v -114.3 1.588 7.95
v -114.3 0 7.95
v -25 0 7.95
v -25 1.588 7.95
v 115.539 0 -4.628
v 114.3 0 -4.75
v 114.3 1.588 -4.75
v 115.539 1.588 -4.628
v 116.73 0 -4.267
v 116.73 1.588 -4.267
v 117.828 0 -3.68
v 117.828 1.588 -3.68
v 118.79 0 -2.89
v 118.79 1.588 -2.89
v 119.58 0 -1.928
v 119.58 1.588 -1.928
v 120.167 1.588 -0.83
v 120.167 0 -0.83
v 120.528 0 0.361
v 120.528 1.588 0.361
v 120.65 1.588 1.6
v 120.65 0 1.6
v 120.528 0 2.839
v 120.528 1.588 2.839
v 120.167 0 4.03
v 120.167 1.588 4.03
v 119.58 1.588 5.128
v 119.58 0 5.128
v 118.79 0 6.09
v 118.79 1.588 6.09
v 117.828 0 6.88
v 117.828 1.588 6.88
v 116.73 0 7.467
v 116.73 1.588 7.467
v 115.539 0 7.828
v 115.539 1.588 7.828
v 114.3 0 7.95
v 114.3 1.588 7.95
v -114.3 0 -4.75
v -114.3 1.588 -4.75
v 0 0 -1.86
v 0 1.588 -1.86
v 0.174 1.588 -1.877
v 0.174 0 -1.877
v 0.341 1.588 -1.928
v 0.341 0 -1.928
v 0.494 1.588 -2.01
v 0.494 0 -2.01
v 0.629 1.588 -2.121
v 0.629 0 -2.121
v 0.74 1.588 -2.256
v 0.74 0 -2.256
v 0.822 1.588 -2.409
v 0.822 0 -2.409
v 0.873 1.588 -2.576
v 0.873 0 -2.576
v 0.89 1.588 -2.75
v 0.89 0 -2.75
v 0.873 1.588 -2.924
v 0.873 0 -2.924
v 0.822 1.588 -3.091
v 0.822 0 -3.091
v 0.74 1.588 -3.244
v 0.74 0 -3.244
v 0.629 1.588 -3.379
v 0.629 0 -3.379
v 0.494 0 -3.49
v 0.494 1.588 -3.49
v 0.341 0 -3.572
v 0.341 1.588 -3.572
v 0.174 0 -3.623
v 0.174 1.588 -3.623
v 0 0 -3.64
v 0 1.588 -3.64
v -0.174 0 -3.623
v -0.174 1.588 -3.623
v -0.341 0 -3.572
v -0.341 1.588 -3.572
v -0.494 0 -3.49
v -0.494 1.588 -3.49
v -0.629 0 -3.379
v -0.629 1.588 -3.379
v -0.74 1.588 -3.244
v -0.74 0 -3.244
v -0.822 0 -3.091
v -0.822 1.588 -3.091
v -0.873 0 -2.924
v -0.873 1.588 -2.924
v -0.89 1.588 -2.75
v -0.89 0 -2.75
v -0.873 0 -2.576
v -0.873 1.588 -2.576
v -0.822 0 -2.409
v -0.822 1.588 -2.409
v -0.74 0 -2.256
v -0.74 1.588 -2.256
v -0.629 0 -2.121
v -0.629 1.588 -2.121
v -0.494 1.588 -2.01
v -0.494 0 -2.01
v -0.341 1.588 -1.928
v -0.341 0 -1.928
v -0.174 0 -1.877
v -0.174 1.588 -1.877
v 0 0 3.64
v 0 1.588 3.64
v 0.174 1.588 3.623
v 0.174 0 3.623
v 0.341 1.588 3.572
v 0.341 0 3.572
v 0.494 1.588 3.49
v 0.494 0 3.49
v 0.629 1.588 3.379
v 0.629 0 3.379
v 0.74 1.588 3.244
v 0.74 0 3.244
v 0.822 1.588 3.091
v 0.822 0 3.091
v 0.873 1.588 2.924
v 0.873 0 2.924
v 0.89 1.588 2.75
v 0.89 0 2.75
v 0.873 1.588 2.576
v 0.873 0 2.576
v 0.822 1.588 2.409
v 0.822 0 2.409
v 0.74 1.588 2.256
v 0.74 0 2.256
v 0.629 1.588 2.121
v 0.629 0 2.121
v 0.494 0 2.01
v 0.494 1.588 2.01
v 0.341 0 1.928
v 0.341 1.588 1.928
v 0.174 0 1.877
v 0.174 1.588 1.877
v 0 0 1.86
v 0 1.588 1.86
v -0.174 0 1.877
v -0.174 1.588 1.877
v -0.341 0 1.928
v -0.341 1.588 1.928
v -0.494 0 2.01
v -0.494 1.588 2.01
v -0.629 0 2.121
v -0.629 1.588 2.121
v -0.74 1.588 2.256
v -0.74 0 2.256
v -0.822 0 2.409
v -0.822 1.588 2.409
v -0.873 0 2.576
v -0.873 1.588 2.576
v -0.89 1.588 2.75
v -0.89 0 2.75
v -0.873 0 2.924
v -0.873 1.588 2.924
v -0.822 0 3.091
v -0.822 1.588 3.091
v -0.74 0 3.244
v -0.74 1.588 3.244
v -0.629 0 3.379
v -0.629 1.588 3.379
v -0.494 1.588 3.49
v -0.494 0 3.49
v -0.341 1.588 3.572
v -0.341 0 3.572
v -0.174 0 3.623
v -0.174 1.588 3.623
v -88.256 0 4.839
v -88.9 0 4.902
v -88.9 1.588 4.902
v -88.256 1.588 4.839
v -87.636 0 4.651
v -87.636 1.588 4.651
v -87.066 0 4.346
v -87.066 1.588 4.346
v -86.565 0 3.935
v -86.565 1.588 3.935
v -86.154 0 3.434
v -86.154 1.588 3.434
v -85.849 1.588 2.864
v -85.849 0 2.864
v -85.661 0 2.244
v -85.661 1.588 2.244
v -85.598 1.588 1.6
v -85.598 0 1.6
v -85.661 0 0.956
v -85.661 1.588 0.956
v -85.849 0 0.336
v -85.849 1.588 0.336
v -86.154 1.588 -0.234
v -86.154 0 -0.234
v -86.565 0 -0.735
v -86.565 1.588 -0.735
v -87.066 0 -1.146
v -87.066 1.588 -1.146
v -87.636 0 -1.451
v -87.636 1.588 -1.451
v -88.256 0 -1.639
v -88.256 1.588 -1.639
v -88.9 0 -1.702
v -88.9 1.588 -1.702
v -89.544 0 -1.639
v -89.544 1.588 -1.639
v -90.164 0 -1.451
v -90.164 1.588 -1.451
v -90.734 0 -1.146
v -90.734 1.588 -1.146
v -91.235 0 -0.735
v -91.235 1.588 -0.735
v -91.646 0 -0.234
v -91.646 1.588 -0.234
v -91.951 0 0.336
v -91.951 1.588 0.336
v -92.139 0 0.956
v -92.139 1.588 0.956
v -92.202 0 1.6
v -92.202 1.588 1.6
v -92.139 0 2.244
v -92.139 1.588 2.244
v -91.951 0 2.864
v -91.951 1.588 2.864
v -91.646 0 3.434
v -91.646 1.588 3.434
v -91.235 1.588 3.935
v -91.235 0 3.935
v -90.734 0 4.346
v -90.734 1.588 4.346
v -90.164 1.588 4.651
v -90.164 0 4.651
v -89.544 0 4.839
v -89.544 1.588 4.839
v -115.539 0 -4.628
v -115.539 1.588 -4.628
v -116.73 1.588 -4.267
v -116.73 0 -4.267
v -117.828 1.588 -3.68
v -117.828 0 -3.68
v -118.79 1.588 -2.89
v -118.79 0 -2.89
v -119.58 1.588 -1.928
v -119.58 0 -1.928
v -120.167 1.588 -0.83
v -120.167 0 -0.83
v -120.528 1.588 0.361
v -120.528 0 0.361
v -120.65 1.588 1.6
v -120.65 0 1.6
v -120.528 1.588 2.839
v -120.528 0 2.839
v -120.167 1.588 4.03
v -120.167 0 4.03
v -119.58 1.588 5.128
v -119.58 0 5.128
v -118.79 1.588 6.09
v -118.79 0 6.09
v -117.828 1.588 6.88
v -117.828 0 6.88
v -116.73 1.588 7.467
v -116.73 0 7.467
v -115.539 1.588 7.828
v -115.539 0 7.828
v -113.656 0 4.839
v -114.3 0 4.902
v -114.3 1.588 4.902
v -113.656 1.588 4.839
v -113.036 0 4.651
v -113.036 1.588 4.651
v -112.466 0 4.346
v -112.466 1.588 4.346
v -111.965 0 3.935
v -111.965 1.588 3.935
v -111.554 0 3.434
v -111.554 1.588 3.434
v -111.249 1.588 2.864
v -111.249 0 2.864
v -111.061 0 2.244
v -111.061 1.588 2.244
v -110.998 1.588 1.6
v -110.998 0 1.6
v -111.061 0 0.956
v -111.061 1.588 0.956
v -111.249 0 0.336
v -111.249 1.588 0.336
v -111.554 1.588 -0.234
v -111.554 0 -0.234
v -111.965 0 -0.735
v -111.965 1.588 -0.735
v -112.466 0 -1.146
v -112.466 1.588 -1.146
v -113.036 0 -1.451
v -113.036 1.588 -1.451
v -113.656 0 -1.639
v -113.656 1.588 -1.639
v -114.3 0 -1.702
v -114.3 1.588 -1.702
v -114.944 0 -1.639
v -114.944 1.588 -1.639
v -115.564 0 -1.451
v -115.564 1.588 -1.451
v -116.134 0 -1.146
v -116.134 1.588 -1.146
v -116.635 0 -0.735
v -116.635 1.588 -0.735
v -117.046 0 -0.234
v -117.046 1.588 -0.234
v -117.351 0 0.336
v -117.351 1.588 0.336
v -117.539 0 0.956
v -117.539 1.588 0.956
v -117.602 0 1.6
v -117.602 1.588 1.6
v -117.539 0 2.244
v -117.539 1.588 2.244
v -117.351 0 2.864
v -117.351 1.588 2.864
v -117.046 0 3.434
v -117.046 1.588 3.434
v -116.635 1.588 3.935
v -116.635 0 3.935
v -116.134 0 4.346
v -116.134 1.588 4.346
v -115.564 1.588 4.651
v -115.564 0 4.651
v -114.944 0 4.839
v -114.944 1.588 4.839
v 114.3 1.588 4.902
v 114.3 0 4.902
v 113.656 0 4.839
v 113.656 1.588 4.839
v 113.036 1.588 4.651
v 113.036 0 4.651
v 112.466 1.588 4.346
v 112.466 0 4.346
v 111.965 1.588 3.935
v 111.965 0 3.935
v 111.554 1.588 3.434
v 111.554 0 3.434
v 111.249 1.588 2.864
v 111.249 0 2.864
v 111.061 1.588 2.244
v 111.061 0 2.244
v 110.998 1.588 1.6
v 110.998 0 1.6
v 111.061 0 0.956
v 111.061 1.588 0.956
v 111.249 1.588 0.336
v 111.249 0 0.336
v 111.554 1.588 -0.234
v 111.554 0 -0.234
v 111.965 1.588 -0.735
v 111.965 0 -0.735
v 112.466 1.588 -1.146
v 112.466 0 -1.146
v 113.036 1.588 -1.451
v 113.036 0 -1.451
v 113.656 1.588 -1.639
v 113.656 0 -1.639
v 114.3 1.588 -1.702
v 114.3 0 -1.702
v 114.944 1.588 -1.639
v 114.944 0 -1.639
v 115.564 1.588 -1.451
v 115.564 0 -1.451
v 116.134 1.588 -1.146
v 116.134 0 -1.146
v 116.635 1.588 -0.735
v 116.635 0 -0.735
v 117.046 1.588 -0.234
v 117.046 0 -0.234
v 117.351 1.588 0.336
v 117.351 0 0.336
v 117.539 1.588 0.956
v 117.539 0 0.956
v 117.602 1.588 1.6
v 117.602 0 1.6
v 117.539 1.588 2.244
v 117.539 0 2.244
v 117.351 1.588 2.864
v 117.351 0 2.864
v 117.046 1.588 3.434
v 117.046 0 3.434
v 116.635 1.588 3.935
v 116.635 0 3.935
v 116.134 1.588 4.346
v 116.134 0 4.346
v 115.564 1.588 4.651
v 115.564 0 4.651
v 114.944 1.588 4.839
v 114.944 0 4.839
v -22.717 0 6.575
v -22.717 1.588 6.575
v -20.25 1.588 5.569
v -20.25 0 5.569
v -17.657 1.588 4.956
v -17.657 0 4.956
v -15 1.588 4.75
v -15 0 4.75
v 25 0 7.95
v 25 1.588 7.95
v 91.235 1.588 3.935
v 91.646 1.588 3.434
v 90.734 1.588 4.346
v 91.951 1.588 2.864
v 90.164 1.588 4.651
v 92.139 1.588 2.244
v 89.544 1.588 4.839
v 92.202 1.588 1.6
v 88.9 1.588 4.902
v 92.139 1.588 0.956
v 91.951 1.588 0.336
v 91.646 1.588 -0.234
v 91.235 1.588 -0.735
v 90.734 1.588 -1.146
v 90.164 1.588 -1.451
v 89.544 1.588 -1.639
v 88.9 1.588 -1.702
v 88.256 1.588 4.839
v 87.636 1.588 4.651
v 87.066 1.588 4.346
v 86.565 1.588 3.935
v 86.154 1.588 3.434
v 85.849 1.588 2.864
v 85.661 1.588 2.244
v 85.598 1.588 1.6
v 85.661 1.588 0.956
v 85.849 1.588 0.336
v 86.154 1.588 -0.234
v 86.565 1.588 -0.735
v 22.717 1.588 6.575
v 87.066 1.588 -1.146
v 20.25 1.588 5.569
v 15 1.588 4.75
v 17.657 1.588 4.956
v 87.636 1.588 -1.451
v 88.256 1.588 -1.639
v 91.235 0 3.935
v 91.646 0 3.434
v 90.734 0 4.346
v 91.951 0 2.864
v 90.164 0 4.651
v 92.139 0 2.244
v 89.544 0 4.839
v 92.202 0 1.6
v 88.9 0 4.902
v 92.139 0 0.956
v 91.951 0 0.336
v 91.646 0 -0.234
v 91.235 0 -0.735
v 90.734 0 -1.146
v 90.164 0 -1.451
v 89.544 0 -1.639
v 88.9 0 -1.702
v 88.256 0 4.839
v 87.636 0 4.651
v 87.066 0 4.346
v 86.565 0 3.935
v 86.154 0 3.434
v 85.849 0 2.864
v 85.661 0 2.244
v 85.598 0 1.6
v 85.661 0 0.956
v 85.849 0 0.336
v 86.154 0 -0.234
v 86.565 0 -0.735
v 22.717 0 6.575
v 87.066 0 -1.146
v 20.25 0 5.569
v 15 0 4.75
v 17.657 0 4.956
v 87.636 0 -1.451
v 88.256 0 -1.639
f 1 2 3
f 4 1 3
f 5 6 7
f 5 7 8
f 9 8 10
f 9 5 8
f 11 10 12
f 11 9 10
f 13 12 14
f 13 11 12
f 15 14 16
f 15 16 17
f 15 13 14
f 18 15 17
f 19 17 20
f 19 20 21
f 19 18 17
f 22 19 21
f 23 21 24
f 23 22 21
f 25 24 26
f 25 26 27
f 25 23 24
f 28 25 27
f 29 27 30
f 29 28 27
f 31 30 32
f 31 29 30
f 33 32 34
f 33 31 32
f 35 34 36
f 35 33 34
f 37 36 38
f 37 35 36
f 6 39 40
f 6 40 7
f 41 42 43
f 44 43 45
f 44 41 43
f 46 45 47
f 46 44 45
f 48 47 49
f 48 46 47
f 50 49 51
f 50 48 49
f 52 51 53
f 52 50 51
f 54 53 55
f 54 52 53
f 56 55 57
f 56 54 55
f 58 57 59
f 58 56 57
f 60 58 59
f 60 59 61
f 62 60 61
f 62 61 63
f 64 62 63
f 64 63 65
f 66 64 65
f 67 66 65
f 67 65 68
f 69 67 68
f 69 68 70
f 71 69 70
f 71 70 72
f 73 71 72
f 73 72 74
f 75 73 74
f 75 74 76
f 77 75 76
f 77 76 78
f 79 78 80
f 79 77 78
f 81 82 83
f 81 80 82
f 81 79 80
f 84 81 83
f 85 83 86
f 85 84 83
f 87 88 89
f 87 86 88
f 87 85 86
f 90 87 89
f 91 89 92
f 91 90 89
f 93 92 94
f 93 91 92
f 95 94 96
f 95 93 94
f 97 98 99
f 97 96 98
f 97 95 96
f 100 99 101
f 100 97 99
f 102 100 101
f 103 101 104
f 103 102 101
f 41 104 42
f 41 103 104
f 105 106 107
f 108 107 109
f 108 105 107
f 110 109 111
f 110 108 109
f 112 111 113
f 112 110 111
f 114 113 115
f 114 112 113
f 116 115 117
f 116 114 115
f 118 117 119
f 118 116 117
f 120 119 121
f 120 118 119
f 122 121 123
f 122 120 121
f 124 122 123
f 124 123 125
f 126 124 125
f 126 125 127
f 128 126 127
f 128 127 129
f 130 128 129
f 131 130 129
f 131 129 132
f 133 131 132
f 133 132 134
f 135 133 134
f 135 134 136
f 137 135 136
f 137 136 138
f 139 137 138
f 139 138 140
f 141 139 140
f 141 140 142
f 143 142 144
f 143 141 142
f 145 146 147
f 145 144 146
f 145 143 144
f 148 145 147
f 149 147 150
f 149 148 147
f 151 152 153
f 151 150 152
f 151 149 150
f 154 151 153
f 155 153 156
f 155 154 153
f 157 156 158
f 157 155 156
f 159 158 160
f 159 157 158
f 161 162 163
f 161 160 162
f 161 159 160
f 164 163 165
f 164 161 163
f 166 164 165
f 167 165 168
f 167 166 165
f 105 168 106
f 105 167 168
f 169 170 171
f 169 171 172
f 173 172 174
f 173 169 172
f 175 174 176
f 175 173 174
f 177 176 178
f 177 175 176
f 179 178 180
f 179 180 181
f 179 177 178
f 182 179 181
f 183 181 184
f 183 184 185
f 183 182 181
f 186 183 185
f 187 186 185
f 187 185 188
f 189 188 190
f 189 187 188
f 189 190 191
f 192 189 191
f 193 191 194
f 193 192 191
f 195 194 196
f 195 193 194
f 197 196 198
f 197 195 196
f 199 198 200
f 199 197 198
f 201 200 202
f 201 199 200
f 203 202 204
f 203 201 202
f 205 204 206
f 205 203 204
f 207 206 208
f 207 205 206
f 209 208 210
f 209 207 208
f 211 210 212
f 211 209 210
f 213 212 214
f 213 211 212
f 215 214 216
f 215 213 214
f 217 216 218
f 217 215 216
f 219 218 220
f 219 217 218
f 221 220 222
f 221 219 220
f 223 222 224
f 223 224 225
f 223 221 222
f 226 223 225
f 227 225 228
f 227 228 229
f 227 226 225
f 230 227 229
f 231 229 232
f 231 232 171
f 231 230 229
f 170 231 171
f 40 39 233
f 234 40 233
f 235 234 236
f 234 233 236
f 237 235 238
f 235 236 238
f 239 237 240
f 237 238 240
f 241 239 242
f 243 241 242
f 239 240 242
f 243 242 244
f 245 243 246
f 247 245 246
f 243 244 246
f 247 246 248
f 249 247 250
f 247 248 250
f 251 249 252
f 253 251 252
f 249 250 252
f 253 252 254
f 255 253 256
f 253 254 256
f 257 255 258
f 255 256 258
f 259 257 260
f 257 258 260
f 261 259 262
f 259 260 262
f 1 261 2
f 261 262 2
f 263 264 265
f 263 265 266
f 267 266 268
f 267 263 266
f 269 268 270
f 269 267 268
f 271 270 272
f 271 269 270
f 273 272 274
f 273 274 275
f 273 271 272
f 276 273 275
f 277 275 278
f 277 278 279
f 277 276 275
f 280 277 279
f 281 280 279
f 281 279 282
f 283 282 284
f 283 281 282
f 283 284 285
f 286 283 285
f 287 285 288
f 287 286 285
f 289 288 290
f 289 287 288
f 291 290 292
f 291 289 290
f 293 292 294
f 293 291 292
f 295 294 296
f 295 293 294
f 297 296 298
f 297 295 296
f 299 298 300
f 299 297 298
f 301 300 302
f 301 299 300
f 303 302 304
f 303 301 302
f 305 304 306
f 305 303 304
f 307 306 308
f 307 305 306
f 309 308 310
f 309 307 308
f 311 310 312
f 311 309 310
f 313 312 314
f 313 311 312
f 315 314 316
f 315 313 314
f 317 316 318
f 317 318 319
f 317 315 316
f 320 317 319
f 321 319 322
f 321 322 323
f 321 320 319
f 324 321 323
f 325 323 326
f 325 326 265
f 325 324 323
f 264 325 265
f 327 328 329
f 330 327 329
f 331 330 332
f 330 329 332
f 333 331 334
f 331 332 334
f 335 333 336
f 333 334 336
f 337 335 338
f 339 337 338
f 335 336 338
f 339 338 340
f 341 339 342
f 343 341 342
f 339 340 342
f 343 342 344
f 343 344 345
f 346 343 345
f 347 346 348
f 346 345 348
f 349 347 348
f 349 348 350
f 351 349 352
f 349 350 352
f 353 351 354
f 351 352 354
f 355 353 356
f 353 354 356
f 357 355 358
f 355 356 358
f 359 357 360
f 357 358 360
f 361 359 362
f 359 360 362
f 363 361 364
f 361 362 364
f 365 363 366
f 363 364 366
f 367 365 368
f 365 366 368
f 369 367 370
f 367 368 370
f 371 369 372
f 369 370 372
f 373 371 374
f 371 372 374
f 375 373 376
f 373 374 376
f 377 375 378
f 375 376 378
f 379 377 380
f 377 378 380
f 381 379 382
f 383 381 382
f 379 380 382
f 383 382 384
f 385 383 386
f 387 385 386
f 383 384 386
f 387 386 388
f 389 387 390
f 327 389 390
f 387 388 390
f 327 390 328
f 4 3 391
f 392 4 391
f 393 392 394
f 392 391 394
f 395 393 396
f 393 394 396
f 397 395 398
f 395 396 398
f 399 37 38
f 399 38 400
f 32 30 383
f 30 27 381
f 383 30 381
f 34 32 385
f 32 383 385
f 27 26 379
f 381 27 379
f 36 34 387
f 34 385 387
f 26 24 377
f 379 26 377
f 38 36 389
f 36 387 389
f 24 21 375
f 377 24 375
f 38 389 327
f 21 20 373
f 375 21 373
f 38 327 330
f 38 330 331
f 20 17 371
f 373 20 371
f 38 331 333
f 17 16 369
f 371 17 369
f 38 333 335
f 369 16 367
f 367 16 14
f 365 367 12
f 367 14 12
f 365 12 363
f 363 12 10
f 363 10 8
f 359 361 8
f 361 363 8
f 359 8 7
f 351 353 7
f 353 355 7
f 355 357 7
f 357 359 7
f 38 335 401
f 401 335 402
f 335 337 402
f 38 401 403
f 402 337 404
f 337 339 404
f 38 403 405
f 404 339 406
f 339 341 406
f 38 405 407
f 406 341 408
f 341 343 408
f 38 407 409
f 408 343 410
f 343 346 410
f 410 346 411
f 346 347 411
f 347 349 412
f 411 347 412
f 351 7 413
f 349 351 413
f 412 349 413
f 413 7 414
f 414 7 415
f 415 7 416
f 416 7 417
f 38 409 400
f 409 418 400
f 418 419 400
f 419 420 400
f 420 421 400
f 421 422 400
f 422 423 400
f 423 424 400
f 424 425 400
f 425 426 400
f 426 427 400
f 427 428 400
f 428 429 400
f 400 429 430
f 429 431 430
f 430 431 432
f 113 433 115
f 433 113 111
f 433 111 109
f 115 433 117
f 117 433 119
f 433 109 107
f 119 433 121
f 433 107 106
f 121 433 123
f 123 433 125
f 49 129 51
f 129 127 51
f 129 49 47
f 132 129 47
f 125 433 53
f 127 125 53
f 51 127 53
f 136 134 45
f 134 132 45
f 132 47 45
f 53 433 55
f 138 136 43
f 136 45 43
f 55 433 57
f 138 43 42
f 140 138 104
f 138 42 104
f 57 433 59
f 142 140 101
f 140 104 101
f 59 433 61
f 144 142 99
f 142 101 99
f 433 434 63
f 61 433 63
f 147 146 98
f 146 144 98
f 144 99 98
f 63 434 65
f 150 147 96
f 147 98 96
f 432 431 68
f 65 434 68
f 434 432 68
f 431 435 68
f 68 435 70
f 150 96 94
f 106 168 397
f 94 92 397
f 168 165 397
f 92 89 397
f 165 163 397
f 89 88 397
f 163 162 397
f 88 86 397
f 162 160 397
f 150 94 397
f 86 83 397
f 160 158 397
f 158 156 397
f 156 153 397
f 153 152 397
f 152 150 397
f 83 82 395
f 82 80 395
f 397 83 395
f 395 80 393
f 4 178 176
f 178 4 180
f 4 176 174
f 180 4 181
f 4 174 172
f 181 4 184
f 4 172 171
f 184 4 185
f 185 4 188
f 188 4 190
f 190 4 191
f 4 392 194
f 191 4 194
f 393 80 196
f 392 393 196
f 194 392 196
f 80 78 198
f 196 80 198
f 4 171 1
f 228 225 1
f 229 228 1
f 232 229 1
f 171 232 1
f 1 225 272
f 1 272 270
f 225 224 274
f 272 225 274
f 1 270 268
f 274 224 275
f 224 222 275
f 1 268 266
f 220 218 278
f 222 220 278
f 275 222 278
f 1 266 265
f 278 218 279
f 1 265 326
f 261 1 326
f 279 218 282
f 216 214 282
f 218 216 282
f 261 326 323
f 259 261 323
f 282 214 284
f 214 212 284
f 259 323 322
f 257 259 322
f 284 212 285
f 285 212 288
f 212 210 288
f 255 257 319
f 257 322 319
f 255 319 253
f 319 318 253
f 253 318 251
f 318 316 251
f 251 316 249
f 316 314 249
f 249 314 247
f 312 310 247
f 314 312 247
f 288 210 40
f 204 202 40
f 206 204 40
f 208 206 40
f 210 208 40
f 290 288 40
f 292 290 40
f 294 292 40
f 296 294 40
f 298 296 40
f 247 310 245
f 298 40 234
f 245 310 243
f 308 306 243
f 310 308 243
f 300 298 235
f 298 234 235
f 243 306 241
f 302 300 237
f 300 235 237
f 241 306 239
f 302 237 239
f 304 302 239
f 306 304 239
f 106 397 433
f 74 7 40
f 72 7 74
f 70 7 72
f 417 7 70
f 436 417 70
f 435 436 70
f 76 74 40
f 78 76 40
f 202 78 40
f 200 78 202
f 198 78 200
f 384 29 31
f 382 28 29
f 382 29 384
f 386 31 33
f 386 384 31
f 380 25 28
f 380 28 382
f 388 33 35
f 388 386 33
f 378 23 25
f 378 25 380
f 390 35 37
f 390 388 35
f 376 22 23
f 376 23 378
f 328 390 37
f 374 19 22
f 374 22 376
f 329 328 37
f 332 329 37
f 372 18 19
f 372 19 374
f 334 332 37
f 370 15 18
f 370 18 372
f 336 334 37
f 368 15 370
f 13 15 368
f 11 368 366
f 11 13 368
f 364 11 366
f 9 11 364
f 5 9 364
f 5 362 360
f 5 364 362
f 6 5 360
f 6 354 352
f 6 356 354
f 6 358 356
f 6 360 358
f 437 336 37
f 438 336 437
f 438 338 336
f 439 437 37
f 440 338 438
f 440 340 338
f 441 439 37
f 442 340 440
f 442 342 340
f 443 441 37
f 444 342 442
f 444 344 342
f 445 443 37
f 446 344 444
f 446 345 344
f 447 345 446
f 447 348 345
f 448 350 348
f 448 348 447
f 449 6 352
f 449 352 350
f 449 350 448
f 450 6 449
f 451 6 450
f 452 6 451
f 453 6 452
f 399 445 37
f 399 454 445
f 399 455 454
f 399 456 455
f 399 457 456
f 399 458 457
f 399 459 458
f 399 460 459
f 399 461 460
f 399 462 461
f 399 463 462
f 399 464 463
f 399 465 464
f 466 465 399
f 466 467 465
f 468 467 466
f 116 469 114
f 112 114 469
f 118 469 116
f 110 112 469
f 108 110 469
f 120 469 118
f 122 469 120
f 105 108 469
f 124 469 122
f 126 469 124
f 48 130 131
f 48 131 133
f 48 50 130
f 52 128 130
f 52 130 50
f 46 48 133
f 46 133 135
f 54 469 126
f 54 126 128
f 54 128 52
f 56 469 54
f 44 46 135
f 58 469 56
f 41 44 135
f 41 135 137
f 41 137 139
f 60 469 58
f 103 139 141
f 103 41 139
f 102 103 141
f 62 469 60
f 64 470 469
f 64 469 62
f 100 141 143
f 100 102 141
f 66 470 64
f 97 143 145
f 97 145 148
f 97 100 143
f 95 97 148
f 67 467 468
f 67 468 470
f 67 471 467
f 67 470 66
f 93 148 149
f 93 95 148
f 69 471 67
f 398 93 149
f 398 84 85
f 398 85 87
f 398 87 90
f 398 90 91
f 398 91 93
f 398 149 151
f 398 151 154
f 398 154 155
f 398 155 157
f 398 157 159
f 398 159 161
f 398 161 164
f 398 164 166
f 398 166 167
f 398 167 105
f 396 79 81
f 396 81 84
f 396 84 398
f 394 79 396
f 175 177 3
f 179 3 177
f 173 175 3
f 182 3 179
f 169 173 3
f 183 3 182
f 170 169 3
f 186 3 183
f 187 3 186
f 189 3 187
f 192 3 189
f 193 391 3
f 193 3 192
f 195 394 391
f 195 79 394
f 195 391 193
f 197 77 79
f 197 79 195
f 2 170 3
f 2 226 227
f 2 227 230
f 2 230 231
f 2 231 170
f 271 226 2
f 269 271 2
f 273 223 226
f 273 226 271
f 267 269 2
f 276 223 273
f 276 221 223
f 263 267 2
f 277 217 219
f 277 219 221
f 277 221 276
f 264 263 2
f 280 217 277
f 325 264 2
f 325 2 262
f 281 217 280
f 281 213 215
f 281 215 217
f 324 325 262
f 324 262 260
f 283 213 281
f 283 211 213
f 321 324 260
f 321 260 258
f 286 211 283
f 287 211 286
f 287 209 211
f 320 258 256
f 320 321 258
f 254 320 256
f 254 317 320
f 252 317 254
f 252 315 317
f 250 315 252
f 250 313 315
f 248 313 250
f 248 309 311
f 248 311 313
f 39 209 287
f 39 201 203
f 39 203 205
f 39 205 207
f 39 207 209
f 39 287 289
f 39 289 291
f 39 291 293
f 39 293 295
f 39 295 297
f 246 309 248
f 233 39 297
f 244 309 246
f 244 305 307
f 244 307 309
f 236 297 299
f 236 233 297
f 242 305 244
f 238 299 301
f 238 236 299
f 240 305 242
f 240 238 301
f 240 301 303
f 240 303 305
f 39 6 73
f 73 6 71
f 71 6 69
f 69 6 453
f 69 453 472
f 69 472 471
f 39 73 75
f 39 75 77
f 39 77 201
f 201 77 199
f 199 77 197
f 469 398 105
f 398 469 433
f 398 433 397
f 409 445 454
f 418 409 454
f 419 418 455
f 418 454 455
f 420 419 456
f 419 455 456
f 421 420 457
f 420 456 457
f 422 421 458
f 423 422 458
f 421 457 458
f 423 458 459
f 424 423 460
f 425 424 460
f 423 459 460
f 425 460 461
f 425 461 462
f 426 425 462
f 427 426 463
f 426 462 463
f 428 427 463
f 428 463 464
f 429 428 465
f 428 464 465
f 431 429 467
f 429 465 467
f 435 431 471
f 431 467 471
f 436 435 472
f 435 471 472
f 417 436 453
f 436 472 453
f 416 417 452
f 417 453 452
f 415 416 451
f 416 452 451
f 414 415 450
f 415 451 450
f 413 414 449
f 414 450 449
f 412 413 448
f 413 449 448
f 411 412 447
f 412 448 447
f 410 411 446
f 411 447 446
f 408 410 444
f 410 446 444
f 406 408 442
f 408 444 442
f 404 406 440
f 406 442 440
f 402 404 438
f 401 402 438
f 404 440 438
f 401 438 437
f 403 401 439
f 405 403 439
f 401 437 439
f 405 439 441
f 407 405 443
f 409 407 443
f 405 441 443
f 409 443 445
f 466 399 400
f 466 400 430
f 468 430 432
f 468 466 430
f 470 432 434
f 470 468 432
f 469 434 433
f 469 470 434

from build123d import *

# Parameters (mm, degrees)
SKETCH5_R           = 3.302
BOSS_EXTRUDE1_DEPTH = 1.5875
SKETCH6_R           = 0.89
CUT_EXTRUDE2_DEPTH  = 121.922062322


with BuildPart() as part:
    # Sketch5 → Boss-Extrude1 (new body)
    with BuildSketch(Plane(origin=(0, 0, 0), x_dir=(1, 0, 0), z_dir=(0, 1, 0))):
        with BuildLine():
            Line((0, 4.75), (-114.3, 4.75))
            ThreePointArc((-114.3, 4.75), (-120.65, -1.6), (-114.3, -7.95))
            Line((-114.3, -7.95), (-25, -7.95))
            ThreePointArc((-25, -7.95), (-20.249761899, -5.569494064), (-15, -4.75))
            Line((-15, -4.75), (0, -4.75))
            Line((0, -4.75), (0, 4.75))
        make_face()
        with Locations(Location((-114.3, -1.6, 0), (0, 0, 270))):
            Circle(SKETCH5_R, mode=Mode.SUBTRACT)
        with Locations(Location((-88.9, -1.6, 0), (0, 0, 270))):
            Circle(SKETCH5_R, mode=Mode.SUBTRACT)
    boss_extrude1 = extrude(amount=BOSS_EXTRUDE1_DEPTH)

    # Mirror1: Boss-Extrude1 across plane
    add(boss_extrude1.mirror(Plane(origin=(0, 1.5875, -4.75), x_dir=(0, 0, 1), z_dir=(-1, 0, 0))))

    # Sketch6 → Cut-Extrude2 (cut, through all)
    with BuildSketch(Plane(origin=(0, 0, 0), x_dir=(1, 0, 0), z_dir=(0, 1, 0))):
        with Locations(Location((0, 2.75, 0), (0, 0, 270))):
            Circle(SKETCH6_R)
        with Locations(Location((0, -2.75, 0), (0, 0, 270))):
            Circle(SKETCH6_R)
    extrude(amount=CUT_EXTRUDE2_DEPTH, mode=Mode.SUBTRACT)


solid = part.part
